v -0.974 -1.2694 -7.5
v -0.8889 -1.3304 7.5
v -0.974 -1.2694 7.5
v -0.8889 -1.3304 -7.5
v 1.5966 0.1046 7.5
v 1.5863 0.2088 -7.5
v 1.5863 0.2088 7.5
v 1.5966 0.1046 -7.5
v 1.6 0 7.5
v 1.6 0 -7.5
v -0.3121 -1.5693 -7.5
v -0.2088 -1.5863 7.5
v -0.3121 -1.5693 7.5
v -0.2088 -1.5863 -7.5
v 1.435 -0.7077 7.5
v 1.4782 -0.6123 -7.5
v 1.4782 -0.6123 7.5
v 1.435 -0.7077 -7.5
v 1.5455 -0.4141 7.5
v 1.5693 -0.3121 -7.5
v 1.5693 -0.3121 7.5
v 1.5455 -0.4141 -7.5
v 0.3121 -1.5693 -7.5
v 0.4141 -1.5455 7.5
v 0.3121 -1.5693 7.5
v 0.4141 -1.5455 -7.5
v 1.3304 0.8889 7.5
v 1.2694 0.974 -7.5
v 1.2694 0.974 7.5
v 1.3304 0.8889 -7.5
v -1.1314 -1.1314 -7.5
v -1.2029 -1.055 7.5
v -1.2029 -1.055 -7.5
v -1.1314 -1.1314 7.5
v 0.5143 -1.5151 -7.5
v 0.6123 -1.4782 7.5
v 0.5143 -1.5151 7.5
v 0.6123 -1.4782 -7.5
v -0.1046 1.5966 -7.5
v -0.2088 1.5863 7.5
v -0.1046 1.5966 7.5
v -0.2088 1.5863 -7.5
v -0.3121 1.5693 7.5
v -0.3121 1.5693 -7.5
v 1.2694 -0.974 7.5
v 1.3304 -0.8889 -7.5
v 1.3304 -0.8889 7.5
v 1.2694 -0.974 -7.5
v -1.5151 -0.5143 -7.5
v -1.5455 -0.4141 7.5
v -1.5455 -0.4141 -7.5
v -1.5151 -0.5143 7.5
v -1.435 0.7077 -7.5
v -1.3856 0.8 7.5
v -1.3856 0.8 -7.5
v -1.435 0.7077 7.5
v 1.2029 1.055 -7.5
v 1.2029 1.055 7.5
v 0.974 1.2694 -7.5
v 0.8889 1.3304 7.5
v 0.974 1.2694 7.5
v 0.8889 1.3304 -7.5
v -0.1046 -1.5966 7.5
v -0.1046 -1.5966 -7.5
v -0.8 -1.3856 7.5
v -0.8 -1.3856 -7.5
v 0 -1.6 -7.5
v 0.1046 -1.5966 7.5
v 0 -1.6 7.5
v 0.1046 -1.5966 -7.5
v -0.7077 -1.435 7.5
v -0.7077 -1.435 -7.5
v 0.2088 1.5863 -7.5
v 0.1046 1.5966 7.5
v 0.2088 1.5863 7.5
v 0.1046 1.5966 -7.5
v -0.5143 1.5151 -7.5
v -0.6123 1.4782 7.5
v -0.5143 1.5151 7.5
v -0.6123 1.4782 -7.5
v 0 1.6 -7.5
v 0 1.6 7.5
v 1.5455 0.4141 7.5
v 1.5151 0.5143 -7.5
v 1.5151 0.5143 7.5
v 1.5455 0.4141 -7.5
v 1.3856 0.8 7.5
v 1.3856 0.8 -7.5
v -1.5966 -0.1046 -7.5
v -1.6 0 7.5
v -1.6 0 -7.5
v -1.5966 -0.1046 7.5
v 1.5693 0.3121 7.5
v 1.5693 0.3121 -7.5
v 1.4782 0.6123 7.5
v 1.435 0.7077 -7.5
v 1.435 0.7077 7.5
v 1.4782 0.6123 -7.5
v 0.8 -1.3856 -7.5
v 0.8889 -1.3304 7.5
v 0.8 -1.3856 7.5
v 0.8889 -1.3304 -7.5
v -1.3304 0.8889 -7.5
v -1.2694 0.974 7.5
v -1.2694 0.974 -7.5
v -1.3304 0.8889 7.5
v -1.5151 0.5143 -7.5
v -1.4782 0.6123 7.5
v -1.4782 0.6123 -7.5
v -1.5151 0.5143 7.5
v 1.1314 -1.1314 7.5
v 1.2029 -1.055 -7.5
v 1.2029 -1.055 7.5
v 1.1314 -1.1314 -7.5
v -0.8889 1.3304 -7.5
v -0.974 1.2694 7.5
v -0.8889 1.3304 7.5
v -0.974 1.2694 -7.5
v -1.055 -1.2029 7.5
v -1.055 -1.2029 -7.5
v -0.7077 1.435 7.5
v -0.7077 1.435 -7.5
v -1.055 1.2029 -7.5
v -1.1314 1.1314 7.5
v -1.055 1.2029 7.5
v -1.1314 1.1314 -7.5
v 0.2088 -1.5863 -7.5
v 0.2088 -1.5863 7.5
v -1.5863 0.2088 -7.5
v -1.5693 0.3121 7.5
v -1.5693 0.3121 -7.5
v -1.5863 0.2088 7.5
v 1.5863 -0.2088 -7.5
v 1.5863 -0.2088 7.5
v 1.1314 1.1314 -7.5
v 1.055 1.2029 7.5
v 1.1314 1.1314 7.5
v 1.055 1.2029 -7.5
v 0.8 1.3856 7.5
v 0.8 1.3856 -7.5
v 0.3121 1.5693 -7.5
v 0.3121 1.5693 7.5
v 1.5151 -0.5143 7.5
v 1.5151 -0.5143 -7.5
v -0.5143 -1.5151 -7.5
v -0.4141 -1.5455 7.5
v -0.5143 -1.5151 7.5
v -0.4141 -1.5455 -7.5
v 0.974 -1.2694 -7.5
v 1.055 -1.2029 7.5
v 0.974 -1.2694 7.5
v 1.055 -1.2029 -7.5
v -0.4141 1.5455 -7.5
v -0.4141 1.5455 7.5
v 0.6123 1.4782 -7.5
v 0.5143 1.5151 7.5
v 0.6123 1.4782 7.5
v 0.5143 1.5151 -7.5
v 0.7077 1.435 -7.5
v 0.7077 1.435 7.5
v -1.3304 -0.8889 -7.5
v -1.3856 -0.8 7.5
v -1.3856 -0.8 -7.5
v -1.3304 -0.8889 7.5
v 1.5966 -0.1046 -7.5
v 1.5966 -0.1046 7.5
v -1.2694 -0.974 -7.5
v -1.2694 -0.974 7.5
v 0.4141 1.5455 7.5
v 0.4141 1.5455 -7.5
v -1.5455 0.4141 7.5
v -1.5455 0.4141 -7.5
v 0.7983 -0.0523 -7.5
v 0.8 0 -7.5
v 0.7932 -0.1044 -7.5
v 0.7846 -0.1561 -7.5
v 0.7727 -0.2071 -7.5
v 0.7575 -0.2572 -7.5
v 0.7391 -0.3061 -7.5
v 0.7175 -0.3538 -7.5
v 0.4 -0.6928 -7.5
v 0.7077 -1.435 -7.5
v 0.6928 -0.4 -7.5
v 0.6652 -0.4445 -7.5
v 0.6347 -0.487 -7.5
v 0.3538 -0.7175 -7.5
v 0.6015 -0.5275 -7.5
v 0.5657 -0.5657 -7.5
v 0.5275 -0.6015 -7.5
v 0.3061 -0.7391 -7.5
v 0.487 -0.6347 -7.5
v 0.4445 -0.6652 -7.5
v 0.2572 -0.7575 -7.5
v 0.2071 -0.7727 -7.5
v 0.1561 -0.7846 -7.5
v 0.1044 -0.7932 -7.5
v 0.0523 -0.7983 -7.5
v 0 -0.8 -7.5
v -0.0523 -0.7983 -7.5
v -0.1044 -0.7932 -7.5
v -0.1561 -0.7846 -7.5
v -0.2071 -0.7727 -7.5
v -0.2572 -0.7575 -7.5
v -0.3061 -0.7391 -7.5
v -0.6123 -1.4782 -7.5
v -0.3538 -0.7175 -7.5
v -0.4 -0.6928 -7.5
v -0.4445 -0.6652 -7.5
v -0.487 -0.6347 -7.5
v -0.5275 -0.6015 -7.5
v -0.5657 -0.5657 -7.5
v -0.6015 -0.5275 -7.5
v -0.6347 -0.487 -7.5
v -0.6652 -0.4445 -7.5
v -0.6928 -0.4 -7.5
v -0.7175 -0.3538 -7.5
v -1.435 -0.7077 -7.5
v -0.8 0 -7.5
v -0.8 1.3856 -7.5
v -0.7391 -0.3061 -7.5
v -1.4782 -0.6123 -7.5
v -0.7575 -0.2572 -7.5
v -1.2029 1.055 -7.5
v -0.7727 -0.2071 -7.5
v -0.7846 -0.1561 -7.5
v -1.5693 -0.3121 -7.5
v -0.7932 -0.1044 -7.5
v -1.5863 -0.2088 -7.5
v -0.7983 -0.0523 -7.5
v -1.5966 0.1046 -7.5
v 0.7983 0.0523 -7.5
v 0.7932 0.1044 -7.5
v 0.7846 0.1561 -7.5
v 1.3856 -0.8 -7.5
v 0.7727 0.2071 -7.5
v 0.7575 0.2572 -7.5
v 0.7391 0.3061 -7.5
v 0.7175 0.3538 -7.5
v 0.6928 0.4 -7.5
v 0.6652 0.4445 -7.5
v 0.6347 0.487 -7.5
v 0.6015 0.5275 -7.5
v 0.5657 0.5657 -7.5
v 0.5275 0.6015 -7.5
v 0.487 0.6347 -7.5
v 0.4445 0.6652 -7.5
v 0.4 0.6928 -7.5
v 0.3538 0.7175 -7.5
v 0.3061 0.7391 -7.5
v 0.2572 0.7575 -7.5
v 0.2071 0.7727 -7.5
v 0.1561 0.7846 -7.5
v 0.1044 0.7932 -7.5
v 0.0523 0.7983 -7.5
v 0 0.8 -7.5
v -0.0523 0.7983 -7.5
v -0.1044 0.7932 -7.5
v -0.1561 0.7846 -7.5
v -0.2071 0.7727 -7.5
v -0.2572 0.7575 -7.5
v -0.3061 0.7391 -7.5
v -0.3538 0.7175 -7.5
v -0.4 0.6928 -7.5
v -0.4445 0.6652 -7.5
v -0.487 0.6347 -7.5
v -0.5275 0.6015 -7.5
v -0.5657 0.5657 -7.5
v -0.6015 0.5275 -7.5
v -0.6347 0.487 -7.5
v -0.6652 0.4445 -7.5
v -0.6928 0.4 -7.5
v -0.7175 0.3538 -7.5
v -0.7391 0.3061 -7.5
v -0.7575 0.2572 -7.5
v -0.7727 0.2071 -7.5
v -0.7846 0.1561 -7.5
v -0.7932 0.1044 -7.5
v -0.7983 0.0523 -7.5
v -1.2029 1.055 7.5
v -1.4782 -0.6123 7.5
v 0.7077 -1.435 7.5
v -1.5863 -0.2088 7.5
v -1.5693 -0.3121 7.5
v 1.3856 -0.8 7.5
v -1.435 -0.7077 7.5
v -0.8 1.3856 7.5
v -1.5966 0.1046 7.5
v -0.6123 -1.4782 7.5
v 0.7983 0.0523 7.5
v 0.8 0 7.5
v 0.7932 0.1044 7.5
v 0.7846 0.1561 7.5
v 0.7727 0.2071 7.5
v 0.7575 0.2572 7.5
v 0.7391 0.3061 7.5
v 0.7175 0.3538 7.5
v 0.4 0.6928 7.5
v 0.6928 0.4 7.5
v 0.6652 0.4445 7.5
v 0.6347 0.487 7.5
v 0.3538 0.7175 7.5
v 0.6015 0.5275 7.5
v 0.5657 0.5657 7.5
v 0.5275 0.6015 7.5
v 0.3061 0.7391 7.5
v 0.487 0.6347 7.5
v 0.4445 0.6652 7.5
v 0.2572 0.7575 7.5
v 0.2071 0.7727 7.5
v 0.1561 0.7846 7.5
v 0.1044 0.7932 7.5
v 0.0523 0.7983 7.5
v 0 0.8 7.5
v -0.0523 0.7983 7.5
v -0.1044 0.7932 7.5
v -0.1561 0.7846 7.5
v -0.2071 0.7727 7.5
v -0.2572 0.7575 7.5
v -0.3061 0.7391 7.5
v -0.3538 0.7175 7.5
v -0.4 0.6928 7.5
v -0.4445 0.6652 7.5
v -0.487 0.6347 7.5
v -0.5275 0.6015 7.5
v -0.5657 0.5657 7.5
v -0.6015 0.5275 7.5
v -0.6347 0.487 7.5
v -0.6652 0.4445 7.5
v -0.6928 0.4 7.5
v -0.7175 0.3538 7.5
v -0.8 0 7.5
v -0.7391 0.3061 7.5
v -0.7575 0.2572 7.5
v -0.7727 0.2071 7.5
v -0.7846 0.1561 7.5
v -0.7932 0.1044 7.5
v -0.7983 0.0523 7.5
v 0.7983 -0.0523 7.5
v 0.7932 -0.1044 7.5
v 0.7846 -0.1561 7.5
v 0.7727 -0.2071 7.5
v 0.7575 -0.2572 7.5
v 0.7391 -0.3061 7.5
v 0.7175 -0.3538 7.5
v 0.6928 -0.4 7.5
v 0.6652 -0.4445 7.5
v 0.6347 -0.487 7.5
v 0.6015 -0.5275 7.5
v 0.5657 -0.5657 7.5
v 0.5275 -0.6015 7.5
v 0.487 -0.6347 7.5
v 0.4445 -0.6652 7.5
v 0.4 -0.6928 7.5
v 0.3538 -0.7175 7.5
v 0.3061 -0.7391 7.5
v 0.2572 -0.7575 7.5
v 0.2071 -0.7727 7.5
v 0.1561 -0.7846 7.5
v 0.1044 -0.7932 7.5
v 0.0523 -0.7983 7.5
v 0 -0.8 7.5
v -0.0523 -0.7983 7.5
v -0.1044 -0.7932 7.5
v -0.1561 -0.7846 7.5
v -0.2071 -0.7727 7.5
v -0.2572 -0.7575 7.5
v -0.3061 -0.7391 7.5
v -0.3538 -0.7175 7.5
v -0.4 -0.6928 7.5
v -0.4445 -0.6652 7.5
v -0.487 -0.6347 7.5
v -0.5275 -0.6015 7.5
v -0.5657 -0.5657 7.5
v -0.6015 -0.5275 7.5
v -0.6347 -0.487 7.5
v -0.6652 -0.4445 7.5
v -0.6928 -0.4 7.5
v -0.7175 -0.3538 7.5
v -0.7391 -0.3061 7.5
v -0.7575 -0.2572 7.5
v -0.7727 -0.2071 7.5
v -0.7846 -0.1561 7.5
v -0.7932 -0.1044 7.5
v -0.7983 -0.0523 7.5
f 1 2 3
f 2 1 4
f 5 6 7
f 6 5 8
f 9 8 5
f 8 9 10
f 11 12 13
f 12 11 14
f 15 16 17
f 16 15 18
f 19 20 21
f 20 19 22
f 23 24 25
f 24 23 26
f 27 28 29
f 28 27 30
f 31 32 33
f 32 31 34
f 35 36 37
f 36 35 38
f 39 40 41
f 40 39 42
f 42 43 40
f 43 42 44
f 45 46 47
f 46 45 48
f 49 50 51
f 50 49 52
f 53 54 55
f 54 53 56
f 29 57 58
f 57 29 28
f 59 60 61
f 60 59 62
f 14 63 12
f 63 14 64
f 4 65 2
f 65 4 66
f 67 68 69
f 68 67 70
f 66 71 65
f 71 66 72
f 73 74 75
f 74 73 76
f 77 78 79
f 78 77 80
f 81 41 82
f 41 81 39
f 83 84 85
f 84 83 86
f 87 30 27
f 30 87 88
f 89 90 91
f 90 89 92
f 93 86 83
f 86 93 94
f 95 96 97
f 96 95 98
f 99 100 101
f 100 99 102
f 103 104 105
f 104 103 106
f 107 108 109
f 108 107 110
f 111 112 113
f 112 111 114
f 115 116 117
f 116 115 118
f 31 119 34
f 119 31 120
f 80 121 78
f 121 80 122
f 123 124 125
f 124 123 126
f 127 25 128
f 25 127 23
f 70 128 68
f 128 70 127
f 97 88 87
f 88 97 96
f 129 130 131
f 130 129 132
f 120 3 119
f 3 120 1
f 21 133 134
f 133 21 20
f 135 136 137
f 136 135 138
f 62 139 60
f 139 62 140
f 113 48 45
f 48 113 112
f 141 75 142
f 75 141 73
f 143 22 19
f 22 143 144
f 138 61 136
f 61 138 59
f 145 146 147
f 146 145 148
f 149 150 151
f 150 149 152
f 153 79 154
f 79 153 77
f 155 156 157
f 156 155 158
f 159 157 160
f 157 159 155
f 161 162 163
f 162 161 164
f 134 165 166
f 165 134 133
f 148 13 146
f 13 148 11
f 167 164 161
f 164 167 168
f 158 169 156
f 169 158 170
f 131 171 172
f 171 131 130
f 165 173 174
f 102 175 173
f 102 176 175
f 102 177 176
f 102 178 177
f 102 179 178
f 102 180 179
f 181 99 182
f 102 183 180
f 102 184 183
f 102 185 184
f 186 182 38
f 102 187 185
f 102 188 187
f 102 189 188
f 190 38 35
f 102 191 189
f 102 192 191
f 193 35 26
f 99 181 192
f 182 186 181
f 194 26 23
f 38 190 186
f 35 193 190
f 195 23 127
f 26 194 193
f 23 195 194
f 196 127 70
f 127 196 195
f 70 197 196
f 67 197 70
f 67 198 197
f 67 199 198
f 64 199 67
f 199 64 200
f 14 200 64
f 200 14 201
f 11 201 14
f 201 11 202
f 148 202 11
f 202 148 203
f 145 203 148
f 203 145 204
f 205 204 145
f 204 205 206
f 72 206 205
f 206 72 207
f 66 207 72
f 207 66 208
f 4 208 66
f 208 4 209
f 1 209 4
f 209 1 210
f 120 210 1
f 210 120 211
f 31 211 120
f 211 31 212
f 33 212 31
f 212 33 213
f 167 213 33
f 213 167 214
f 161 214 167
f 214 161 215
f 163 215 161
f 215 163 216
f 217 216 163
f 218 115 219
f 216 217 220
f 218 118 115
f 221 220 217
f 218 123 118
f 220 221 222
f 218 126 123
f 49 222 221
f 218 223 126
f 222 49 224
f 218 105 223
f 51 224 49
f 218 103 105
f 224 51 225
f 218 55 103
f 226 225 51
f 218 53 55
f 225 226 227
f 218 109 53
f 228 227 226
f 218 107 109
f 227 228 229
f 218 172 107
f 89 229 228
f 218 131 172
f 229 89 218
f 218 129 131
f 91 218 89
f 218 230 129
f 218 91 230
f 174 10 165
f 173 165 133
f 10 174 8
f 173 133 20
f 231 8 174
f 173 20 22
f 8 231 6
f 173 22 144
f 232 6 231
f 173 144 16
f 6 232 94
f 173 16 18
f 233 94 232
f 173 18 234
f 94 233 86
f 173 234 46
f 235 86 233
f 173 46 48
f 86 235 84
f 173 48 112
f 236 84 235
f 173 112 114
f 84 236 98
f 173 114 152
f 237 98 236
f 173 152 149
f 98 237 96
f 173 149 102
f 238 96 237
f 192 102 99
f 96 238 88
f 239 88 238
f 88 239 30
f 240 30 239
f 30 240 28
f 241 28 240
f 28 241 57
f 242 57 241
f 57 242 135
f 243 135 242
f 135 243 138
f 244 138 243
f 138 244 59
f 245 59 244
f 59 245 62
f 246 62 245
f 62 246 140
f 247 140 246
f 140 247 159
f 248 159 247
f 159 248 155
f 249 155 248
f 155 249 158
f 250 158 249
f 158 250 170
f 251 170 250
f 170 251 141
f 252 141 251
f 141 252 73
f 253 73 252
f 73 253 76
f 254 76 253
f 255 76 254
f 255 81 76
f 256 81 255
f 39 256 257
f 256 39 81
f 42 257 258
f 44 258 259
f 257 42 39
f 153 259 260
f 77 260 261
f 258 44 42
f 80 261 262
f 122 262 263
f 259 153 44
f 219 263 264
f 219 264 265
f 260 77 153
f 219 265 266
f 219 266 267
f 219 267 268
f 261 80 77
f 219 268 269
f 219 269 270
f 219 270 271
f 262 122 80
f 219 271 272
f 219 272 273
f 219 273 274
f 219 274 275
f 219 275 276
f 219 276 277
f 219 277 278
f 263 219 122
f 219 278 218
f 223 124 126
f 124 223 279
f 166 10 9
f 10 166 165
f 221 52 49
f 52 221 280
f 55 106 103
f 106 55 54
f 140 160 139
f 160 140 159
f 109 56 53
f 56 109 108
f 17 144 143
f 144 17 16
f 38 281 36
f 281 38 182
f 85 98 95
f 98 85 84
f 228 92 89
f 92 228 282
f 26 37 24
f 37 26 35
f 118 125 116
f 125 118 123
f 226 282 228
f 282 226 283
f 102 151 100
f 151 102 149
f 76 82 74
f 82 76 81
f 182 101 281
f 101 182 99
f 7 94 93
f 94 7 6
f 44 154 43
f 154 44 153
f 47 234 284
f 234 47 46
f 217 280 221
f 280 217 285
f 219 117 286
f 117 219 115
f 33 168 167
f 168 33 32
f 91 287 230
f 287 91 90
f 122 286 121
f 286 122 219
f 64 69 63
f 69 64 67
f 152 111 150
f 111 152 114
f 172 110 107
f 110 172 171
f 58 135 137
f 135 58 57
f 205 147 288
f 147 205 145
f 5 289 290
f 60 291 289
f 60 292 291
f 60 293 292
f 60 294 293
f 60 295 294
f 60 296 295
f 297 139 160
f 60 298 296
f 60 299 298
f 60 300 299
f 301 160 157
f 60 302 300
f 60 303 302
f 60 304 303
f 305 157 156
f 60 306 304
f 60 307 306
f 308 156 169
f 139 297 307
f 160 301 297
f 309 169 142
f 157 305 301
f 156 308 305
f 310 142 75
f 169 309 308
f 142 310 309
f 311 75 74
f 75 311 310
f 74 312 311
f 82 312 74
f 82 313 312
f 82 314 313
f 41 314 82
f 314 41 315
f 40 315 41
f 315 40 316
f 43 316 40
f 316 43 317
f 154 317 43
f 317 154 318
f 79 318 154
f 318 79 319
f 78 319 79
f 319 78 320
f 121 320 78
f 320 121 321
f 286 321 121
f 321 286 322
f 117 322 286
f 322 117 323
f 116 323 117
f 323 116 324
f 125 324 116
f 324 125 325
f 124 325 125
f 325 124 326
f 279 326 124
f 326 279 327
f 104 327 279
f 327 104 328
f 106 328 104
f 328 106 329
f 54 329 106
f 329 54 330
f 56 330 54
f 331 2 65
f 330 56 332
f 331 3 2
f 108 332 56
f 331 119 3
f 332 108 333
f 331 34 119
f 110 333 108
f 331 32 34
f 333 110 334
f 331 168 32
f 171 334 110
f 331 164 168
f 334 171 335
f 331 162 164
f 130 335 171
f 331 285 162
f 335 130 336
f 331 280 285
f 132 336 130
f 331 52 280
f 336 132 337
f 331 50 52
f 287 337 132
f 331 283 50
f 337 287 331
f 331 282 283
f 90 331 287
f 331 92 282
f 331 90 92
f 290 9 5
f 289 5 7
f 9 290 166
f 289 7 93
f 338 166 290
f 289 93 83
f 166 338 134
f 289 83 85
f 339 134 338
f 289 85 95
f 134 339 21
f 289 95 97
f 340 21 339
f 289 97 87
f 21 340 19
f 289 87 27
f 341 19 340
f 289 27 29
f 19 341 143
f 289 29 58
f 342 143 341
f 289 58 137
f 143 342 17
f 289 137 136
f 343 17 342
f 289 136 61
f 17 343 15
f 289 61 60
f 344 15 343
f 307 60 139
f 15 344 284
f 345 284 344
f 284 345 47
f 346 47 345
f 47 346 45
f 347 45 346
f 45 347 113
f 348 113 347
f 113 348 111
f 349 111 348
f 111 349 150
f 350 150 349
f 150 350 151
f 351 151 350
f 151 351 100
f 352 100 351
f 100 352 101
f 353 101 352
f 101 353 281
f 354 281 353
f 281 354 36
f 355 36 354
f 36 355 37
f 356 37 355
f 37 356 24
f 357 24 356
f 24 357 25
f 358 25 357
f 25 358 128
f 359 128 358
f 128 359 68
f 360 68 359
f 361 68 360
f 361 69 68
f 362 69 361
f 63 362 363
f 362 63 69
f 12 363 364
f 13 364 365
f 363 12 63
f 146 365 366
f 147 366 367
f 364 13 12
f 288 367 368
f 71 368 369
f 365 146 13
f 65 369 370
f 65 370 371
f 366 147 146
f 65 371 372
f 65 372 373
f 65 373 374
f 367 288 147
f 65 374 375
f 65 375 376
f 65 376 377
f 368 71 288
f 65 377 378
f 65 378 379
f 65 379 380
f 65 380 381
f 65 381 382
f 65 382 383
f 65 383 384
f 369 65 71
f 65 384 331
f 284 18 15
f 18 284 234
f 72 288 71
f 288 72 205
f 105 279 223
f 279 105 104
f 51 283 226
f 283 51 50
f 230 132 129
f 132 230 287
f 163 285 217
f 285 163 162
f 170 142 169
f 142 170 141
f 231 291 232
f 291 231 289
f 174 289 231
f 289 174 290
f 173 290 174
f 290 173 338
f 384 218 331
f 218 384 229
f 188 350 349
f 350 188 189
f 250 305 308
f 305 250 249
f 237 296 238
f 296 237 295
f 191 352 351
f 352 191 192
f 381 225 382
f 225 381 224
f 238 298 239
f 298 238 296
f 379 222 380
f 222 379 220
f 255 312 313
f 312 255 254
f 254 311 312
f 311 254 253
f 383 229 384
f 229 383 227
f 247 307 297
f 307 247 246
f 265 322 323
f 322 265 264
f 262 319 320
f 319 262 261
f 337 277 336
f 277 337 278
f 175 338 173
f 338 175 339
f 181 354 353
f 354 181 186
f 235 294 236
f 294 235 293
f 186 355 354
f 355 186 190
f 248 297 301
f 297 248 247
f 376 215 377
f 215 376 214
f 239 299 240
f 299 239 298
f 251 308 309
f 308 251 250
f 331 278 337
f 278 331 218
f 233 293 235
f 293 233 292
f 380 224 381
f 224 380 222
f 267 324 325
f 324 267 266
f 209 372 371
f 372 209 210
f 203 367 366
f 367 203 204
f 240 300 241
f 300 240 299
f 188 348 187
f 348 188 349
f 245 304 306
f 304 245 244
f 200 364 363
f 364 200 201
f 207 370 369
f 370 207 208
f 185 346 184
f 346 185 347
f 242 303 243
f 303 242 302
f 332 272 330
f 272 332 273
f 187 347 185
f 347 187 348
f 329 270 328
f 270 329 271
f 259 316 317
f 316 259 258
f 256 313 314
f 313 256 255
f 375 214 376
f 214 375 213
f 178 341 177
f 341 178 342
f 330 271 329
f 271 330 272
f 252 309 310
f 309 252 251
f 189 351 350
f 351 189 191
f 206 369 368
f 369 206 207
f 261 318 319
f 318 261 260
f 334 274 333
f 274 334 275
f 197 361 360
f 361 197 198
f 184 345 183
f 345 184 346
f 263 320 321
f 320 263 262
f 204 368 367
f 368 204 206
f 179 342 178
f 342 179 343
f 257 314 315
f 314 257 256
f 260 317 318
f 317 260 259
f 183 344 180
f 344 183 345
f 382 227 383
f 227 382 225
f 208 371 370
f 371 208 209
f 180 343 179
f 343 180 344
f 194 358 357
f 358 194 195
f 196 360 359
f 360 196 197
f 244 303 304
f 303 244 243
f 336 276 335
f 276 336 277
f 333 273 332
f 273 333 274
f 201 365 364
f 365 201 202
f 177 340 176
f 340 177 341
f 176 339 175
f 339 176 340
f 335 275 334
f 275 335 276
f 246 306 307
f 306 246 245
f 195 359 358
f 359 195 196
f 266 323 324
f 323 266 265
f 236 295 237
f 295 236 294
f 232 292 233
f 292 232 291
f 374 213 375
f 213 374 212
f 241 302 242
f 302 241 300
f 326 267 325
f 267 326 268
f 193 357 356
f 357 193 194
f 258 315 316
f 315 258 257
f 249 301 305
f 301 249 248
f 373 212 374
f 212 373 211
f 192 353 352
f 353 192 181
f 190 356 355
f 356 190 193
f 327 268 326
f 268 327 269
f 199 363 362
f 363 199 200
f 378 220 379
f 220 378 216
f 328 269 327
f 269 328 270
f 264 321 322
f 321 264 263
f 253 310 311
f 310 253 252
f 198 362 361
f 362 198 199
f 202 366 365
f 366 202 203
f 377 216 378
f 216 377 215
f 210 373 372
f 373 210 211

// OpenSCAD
// Heatshrink sleeving (simple hollow round tube) - one connected solid

// Parameters
length = 15; //[8:60:1]
center = 1; //[0:1:1]
forced_id = 0; //[0:20:1]
tubing_type_id = 1; //[1:3:1]
hs_id_type1 = 1.6; //[0.8:3.2:0.1]
hs_od_type1 = 3.2; //[1.6:6.4:0.1]
hs_id_type2 = 3.2; //[1.6:6.4:0.1]
hs_od_type2 = 6.4; //[3.2:12.8:0.1]
hs_id_type3 = 6.4; //[3.2:12.8:0.1]
hs_od_type3 = 12.7; //[6.4:25.4:0.1]
overlap = 1; //[0.5:2:0.1]

// Smoothness (prevents faceted/hex look)
$fn = 96;

// Select dimensions
od = (tubing_type_id == 1) ? hs_od_type1 :
     (tubing_type_id == 2) ? hs_od_type2 : hs_od_type3;

id_nom = (tubing_type_id == 1) ? hs_id_type1 :
         (tubing_type_id == 2) ? hs_id_type2 : hs_id_type3;

id = (forced_id > 0) ? forced_id : id_nom;

// Radii with safety clamps
outer_radius = max(od/2, 0.01);
inner_radius = max(min(id/2, outer_radius - 0.2), 0.01); // ensure wall thickness

// Z placement (centered or sitting on Z=0)
z0 = (center == 1) ? 0 : length/2;

module heatshrink_tube() {
  color([0.85, 0.85, 0.8])
  translate([0, 0, z0])
  difference() {
    cylinder(h=length, r=outer_radius, center=true);
    cylinder(h=length + 2*overlap, r=inner_radius, center=true);
  }
}

// One connected solid: only the tube
heatshrink_tube();
